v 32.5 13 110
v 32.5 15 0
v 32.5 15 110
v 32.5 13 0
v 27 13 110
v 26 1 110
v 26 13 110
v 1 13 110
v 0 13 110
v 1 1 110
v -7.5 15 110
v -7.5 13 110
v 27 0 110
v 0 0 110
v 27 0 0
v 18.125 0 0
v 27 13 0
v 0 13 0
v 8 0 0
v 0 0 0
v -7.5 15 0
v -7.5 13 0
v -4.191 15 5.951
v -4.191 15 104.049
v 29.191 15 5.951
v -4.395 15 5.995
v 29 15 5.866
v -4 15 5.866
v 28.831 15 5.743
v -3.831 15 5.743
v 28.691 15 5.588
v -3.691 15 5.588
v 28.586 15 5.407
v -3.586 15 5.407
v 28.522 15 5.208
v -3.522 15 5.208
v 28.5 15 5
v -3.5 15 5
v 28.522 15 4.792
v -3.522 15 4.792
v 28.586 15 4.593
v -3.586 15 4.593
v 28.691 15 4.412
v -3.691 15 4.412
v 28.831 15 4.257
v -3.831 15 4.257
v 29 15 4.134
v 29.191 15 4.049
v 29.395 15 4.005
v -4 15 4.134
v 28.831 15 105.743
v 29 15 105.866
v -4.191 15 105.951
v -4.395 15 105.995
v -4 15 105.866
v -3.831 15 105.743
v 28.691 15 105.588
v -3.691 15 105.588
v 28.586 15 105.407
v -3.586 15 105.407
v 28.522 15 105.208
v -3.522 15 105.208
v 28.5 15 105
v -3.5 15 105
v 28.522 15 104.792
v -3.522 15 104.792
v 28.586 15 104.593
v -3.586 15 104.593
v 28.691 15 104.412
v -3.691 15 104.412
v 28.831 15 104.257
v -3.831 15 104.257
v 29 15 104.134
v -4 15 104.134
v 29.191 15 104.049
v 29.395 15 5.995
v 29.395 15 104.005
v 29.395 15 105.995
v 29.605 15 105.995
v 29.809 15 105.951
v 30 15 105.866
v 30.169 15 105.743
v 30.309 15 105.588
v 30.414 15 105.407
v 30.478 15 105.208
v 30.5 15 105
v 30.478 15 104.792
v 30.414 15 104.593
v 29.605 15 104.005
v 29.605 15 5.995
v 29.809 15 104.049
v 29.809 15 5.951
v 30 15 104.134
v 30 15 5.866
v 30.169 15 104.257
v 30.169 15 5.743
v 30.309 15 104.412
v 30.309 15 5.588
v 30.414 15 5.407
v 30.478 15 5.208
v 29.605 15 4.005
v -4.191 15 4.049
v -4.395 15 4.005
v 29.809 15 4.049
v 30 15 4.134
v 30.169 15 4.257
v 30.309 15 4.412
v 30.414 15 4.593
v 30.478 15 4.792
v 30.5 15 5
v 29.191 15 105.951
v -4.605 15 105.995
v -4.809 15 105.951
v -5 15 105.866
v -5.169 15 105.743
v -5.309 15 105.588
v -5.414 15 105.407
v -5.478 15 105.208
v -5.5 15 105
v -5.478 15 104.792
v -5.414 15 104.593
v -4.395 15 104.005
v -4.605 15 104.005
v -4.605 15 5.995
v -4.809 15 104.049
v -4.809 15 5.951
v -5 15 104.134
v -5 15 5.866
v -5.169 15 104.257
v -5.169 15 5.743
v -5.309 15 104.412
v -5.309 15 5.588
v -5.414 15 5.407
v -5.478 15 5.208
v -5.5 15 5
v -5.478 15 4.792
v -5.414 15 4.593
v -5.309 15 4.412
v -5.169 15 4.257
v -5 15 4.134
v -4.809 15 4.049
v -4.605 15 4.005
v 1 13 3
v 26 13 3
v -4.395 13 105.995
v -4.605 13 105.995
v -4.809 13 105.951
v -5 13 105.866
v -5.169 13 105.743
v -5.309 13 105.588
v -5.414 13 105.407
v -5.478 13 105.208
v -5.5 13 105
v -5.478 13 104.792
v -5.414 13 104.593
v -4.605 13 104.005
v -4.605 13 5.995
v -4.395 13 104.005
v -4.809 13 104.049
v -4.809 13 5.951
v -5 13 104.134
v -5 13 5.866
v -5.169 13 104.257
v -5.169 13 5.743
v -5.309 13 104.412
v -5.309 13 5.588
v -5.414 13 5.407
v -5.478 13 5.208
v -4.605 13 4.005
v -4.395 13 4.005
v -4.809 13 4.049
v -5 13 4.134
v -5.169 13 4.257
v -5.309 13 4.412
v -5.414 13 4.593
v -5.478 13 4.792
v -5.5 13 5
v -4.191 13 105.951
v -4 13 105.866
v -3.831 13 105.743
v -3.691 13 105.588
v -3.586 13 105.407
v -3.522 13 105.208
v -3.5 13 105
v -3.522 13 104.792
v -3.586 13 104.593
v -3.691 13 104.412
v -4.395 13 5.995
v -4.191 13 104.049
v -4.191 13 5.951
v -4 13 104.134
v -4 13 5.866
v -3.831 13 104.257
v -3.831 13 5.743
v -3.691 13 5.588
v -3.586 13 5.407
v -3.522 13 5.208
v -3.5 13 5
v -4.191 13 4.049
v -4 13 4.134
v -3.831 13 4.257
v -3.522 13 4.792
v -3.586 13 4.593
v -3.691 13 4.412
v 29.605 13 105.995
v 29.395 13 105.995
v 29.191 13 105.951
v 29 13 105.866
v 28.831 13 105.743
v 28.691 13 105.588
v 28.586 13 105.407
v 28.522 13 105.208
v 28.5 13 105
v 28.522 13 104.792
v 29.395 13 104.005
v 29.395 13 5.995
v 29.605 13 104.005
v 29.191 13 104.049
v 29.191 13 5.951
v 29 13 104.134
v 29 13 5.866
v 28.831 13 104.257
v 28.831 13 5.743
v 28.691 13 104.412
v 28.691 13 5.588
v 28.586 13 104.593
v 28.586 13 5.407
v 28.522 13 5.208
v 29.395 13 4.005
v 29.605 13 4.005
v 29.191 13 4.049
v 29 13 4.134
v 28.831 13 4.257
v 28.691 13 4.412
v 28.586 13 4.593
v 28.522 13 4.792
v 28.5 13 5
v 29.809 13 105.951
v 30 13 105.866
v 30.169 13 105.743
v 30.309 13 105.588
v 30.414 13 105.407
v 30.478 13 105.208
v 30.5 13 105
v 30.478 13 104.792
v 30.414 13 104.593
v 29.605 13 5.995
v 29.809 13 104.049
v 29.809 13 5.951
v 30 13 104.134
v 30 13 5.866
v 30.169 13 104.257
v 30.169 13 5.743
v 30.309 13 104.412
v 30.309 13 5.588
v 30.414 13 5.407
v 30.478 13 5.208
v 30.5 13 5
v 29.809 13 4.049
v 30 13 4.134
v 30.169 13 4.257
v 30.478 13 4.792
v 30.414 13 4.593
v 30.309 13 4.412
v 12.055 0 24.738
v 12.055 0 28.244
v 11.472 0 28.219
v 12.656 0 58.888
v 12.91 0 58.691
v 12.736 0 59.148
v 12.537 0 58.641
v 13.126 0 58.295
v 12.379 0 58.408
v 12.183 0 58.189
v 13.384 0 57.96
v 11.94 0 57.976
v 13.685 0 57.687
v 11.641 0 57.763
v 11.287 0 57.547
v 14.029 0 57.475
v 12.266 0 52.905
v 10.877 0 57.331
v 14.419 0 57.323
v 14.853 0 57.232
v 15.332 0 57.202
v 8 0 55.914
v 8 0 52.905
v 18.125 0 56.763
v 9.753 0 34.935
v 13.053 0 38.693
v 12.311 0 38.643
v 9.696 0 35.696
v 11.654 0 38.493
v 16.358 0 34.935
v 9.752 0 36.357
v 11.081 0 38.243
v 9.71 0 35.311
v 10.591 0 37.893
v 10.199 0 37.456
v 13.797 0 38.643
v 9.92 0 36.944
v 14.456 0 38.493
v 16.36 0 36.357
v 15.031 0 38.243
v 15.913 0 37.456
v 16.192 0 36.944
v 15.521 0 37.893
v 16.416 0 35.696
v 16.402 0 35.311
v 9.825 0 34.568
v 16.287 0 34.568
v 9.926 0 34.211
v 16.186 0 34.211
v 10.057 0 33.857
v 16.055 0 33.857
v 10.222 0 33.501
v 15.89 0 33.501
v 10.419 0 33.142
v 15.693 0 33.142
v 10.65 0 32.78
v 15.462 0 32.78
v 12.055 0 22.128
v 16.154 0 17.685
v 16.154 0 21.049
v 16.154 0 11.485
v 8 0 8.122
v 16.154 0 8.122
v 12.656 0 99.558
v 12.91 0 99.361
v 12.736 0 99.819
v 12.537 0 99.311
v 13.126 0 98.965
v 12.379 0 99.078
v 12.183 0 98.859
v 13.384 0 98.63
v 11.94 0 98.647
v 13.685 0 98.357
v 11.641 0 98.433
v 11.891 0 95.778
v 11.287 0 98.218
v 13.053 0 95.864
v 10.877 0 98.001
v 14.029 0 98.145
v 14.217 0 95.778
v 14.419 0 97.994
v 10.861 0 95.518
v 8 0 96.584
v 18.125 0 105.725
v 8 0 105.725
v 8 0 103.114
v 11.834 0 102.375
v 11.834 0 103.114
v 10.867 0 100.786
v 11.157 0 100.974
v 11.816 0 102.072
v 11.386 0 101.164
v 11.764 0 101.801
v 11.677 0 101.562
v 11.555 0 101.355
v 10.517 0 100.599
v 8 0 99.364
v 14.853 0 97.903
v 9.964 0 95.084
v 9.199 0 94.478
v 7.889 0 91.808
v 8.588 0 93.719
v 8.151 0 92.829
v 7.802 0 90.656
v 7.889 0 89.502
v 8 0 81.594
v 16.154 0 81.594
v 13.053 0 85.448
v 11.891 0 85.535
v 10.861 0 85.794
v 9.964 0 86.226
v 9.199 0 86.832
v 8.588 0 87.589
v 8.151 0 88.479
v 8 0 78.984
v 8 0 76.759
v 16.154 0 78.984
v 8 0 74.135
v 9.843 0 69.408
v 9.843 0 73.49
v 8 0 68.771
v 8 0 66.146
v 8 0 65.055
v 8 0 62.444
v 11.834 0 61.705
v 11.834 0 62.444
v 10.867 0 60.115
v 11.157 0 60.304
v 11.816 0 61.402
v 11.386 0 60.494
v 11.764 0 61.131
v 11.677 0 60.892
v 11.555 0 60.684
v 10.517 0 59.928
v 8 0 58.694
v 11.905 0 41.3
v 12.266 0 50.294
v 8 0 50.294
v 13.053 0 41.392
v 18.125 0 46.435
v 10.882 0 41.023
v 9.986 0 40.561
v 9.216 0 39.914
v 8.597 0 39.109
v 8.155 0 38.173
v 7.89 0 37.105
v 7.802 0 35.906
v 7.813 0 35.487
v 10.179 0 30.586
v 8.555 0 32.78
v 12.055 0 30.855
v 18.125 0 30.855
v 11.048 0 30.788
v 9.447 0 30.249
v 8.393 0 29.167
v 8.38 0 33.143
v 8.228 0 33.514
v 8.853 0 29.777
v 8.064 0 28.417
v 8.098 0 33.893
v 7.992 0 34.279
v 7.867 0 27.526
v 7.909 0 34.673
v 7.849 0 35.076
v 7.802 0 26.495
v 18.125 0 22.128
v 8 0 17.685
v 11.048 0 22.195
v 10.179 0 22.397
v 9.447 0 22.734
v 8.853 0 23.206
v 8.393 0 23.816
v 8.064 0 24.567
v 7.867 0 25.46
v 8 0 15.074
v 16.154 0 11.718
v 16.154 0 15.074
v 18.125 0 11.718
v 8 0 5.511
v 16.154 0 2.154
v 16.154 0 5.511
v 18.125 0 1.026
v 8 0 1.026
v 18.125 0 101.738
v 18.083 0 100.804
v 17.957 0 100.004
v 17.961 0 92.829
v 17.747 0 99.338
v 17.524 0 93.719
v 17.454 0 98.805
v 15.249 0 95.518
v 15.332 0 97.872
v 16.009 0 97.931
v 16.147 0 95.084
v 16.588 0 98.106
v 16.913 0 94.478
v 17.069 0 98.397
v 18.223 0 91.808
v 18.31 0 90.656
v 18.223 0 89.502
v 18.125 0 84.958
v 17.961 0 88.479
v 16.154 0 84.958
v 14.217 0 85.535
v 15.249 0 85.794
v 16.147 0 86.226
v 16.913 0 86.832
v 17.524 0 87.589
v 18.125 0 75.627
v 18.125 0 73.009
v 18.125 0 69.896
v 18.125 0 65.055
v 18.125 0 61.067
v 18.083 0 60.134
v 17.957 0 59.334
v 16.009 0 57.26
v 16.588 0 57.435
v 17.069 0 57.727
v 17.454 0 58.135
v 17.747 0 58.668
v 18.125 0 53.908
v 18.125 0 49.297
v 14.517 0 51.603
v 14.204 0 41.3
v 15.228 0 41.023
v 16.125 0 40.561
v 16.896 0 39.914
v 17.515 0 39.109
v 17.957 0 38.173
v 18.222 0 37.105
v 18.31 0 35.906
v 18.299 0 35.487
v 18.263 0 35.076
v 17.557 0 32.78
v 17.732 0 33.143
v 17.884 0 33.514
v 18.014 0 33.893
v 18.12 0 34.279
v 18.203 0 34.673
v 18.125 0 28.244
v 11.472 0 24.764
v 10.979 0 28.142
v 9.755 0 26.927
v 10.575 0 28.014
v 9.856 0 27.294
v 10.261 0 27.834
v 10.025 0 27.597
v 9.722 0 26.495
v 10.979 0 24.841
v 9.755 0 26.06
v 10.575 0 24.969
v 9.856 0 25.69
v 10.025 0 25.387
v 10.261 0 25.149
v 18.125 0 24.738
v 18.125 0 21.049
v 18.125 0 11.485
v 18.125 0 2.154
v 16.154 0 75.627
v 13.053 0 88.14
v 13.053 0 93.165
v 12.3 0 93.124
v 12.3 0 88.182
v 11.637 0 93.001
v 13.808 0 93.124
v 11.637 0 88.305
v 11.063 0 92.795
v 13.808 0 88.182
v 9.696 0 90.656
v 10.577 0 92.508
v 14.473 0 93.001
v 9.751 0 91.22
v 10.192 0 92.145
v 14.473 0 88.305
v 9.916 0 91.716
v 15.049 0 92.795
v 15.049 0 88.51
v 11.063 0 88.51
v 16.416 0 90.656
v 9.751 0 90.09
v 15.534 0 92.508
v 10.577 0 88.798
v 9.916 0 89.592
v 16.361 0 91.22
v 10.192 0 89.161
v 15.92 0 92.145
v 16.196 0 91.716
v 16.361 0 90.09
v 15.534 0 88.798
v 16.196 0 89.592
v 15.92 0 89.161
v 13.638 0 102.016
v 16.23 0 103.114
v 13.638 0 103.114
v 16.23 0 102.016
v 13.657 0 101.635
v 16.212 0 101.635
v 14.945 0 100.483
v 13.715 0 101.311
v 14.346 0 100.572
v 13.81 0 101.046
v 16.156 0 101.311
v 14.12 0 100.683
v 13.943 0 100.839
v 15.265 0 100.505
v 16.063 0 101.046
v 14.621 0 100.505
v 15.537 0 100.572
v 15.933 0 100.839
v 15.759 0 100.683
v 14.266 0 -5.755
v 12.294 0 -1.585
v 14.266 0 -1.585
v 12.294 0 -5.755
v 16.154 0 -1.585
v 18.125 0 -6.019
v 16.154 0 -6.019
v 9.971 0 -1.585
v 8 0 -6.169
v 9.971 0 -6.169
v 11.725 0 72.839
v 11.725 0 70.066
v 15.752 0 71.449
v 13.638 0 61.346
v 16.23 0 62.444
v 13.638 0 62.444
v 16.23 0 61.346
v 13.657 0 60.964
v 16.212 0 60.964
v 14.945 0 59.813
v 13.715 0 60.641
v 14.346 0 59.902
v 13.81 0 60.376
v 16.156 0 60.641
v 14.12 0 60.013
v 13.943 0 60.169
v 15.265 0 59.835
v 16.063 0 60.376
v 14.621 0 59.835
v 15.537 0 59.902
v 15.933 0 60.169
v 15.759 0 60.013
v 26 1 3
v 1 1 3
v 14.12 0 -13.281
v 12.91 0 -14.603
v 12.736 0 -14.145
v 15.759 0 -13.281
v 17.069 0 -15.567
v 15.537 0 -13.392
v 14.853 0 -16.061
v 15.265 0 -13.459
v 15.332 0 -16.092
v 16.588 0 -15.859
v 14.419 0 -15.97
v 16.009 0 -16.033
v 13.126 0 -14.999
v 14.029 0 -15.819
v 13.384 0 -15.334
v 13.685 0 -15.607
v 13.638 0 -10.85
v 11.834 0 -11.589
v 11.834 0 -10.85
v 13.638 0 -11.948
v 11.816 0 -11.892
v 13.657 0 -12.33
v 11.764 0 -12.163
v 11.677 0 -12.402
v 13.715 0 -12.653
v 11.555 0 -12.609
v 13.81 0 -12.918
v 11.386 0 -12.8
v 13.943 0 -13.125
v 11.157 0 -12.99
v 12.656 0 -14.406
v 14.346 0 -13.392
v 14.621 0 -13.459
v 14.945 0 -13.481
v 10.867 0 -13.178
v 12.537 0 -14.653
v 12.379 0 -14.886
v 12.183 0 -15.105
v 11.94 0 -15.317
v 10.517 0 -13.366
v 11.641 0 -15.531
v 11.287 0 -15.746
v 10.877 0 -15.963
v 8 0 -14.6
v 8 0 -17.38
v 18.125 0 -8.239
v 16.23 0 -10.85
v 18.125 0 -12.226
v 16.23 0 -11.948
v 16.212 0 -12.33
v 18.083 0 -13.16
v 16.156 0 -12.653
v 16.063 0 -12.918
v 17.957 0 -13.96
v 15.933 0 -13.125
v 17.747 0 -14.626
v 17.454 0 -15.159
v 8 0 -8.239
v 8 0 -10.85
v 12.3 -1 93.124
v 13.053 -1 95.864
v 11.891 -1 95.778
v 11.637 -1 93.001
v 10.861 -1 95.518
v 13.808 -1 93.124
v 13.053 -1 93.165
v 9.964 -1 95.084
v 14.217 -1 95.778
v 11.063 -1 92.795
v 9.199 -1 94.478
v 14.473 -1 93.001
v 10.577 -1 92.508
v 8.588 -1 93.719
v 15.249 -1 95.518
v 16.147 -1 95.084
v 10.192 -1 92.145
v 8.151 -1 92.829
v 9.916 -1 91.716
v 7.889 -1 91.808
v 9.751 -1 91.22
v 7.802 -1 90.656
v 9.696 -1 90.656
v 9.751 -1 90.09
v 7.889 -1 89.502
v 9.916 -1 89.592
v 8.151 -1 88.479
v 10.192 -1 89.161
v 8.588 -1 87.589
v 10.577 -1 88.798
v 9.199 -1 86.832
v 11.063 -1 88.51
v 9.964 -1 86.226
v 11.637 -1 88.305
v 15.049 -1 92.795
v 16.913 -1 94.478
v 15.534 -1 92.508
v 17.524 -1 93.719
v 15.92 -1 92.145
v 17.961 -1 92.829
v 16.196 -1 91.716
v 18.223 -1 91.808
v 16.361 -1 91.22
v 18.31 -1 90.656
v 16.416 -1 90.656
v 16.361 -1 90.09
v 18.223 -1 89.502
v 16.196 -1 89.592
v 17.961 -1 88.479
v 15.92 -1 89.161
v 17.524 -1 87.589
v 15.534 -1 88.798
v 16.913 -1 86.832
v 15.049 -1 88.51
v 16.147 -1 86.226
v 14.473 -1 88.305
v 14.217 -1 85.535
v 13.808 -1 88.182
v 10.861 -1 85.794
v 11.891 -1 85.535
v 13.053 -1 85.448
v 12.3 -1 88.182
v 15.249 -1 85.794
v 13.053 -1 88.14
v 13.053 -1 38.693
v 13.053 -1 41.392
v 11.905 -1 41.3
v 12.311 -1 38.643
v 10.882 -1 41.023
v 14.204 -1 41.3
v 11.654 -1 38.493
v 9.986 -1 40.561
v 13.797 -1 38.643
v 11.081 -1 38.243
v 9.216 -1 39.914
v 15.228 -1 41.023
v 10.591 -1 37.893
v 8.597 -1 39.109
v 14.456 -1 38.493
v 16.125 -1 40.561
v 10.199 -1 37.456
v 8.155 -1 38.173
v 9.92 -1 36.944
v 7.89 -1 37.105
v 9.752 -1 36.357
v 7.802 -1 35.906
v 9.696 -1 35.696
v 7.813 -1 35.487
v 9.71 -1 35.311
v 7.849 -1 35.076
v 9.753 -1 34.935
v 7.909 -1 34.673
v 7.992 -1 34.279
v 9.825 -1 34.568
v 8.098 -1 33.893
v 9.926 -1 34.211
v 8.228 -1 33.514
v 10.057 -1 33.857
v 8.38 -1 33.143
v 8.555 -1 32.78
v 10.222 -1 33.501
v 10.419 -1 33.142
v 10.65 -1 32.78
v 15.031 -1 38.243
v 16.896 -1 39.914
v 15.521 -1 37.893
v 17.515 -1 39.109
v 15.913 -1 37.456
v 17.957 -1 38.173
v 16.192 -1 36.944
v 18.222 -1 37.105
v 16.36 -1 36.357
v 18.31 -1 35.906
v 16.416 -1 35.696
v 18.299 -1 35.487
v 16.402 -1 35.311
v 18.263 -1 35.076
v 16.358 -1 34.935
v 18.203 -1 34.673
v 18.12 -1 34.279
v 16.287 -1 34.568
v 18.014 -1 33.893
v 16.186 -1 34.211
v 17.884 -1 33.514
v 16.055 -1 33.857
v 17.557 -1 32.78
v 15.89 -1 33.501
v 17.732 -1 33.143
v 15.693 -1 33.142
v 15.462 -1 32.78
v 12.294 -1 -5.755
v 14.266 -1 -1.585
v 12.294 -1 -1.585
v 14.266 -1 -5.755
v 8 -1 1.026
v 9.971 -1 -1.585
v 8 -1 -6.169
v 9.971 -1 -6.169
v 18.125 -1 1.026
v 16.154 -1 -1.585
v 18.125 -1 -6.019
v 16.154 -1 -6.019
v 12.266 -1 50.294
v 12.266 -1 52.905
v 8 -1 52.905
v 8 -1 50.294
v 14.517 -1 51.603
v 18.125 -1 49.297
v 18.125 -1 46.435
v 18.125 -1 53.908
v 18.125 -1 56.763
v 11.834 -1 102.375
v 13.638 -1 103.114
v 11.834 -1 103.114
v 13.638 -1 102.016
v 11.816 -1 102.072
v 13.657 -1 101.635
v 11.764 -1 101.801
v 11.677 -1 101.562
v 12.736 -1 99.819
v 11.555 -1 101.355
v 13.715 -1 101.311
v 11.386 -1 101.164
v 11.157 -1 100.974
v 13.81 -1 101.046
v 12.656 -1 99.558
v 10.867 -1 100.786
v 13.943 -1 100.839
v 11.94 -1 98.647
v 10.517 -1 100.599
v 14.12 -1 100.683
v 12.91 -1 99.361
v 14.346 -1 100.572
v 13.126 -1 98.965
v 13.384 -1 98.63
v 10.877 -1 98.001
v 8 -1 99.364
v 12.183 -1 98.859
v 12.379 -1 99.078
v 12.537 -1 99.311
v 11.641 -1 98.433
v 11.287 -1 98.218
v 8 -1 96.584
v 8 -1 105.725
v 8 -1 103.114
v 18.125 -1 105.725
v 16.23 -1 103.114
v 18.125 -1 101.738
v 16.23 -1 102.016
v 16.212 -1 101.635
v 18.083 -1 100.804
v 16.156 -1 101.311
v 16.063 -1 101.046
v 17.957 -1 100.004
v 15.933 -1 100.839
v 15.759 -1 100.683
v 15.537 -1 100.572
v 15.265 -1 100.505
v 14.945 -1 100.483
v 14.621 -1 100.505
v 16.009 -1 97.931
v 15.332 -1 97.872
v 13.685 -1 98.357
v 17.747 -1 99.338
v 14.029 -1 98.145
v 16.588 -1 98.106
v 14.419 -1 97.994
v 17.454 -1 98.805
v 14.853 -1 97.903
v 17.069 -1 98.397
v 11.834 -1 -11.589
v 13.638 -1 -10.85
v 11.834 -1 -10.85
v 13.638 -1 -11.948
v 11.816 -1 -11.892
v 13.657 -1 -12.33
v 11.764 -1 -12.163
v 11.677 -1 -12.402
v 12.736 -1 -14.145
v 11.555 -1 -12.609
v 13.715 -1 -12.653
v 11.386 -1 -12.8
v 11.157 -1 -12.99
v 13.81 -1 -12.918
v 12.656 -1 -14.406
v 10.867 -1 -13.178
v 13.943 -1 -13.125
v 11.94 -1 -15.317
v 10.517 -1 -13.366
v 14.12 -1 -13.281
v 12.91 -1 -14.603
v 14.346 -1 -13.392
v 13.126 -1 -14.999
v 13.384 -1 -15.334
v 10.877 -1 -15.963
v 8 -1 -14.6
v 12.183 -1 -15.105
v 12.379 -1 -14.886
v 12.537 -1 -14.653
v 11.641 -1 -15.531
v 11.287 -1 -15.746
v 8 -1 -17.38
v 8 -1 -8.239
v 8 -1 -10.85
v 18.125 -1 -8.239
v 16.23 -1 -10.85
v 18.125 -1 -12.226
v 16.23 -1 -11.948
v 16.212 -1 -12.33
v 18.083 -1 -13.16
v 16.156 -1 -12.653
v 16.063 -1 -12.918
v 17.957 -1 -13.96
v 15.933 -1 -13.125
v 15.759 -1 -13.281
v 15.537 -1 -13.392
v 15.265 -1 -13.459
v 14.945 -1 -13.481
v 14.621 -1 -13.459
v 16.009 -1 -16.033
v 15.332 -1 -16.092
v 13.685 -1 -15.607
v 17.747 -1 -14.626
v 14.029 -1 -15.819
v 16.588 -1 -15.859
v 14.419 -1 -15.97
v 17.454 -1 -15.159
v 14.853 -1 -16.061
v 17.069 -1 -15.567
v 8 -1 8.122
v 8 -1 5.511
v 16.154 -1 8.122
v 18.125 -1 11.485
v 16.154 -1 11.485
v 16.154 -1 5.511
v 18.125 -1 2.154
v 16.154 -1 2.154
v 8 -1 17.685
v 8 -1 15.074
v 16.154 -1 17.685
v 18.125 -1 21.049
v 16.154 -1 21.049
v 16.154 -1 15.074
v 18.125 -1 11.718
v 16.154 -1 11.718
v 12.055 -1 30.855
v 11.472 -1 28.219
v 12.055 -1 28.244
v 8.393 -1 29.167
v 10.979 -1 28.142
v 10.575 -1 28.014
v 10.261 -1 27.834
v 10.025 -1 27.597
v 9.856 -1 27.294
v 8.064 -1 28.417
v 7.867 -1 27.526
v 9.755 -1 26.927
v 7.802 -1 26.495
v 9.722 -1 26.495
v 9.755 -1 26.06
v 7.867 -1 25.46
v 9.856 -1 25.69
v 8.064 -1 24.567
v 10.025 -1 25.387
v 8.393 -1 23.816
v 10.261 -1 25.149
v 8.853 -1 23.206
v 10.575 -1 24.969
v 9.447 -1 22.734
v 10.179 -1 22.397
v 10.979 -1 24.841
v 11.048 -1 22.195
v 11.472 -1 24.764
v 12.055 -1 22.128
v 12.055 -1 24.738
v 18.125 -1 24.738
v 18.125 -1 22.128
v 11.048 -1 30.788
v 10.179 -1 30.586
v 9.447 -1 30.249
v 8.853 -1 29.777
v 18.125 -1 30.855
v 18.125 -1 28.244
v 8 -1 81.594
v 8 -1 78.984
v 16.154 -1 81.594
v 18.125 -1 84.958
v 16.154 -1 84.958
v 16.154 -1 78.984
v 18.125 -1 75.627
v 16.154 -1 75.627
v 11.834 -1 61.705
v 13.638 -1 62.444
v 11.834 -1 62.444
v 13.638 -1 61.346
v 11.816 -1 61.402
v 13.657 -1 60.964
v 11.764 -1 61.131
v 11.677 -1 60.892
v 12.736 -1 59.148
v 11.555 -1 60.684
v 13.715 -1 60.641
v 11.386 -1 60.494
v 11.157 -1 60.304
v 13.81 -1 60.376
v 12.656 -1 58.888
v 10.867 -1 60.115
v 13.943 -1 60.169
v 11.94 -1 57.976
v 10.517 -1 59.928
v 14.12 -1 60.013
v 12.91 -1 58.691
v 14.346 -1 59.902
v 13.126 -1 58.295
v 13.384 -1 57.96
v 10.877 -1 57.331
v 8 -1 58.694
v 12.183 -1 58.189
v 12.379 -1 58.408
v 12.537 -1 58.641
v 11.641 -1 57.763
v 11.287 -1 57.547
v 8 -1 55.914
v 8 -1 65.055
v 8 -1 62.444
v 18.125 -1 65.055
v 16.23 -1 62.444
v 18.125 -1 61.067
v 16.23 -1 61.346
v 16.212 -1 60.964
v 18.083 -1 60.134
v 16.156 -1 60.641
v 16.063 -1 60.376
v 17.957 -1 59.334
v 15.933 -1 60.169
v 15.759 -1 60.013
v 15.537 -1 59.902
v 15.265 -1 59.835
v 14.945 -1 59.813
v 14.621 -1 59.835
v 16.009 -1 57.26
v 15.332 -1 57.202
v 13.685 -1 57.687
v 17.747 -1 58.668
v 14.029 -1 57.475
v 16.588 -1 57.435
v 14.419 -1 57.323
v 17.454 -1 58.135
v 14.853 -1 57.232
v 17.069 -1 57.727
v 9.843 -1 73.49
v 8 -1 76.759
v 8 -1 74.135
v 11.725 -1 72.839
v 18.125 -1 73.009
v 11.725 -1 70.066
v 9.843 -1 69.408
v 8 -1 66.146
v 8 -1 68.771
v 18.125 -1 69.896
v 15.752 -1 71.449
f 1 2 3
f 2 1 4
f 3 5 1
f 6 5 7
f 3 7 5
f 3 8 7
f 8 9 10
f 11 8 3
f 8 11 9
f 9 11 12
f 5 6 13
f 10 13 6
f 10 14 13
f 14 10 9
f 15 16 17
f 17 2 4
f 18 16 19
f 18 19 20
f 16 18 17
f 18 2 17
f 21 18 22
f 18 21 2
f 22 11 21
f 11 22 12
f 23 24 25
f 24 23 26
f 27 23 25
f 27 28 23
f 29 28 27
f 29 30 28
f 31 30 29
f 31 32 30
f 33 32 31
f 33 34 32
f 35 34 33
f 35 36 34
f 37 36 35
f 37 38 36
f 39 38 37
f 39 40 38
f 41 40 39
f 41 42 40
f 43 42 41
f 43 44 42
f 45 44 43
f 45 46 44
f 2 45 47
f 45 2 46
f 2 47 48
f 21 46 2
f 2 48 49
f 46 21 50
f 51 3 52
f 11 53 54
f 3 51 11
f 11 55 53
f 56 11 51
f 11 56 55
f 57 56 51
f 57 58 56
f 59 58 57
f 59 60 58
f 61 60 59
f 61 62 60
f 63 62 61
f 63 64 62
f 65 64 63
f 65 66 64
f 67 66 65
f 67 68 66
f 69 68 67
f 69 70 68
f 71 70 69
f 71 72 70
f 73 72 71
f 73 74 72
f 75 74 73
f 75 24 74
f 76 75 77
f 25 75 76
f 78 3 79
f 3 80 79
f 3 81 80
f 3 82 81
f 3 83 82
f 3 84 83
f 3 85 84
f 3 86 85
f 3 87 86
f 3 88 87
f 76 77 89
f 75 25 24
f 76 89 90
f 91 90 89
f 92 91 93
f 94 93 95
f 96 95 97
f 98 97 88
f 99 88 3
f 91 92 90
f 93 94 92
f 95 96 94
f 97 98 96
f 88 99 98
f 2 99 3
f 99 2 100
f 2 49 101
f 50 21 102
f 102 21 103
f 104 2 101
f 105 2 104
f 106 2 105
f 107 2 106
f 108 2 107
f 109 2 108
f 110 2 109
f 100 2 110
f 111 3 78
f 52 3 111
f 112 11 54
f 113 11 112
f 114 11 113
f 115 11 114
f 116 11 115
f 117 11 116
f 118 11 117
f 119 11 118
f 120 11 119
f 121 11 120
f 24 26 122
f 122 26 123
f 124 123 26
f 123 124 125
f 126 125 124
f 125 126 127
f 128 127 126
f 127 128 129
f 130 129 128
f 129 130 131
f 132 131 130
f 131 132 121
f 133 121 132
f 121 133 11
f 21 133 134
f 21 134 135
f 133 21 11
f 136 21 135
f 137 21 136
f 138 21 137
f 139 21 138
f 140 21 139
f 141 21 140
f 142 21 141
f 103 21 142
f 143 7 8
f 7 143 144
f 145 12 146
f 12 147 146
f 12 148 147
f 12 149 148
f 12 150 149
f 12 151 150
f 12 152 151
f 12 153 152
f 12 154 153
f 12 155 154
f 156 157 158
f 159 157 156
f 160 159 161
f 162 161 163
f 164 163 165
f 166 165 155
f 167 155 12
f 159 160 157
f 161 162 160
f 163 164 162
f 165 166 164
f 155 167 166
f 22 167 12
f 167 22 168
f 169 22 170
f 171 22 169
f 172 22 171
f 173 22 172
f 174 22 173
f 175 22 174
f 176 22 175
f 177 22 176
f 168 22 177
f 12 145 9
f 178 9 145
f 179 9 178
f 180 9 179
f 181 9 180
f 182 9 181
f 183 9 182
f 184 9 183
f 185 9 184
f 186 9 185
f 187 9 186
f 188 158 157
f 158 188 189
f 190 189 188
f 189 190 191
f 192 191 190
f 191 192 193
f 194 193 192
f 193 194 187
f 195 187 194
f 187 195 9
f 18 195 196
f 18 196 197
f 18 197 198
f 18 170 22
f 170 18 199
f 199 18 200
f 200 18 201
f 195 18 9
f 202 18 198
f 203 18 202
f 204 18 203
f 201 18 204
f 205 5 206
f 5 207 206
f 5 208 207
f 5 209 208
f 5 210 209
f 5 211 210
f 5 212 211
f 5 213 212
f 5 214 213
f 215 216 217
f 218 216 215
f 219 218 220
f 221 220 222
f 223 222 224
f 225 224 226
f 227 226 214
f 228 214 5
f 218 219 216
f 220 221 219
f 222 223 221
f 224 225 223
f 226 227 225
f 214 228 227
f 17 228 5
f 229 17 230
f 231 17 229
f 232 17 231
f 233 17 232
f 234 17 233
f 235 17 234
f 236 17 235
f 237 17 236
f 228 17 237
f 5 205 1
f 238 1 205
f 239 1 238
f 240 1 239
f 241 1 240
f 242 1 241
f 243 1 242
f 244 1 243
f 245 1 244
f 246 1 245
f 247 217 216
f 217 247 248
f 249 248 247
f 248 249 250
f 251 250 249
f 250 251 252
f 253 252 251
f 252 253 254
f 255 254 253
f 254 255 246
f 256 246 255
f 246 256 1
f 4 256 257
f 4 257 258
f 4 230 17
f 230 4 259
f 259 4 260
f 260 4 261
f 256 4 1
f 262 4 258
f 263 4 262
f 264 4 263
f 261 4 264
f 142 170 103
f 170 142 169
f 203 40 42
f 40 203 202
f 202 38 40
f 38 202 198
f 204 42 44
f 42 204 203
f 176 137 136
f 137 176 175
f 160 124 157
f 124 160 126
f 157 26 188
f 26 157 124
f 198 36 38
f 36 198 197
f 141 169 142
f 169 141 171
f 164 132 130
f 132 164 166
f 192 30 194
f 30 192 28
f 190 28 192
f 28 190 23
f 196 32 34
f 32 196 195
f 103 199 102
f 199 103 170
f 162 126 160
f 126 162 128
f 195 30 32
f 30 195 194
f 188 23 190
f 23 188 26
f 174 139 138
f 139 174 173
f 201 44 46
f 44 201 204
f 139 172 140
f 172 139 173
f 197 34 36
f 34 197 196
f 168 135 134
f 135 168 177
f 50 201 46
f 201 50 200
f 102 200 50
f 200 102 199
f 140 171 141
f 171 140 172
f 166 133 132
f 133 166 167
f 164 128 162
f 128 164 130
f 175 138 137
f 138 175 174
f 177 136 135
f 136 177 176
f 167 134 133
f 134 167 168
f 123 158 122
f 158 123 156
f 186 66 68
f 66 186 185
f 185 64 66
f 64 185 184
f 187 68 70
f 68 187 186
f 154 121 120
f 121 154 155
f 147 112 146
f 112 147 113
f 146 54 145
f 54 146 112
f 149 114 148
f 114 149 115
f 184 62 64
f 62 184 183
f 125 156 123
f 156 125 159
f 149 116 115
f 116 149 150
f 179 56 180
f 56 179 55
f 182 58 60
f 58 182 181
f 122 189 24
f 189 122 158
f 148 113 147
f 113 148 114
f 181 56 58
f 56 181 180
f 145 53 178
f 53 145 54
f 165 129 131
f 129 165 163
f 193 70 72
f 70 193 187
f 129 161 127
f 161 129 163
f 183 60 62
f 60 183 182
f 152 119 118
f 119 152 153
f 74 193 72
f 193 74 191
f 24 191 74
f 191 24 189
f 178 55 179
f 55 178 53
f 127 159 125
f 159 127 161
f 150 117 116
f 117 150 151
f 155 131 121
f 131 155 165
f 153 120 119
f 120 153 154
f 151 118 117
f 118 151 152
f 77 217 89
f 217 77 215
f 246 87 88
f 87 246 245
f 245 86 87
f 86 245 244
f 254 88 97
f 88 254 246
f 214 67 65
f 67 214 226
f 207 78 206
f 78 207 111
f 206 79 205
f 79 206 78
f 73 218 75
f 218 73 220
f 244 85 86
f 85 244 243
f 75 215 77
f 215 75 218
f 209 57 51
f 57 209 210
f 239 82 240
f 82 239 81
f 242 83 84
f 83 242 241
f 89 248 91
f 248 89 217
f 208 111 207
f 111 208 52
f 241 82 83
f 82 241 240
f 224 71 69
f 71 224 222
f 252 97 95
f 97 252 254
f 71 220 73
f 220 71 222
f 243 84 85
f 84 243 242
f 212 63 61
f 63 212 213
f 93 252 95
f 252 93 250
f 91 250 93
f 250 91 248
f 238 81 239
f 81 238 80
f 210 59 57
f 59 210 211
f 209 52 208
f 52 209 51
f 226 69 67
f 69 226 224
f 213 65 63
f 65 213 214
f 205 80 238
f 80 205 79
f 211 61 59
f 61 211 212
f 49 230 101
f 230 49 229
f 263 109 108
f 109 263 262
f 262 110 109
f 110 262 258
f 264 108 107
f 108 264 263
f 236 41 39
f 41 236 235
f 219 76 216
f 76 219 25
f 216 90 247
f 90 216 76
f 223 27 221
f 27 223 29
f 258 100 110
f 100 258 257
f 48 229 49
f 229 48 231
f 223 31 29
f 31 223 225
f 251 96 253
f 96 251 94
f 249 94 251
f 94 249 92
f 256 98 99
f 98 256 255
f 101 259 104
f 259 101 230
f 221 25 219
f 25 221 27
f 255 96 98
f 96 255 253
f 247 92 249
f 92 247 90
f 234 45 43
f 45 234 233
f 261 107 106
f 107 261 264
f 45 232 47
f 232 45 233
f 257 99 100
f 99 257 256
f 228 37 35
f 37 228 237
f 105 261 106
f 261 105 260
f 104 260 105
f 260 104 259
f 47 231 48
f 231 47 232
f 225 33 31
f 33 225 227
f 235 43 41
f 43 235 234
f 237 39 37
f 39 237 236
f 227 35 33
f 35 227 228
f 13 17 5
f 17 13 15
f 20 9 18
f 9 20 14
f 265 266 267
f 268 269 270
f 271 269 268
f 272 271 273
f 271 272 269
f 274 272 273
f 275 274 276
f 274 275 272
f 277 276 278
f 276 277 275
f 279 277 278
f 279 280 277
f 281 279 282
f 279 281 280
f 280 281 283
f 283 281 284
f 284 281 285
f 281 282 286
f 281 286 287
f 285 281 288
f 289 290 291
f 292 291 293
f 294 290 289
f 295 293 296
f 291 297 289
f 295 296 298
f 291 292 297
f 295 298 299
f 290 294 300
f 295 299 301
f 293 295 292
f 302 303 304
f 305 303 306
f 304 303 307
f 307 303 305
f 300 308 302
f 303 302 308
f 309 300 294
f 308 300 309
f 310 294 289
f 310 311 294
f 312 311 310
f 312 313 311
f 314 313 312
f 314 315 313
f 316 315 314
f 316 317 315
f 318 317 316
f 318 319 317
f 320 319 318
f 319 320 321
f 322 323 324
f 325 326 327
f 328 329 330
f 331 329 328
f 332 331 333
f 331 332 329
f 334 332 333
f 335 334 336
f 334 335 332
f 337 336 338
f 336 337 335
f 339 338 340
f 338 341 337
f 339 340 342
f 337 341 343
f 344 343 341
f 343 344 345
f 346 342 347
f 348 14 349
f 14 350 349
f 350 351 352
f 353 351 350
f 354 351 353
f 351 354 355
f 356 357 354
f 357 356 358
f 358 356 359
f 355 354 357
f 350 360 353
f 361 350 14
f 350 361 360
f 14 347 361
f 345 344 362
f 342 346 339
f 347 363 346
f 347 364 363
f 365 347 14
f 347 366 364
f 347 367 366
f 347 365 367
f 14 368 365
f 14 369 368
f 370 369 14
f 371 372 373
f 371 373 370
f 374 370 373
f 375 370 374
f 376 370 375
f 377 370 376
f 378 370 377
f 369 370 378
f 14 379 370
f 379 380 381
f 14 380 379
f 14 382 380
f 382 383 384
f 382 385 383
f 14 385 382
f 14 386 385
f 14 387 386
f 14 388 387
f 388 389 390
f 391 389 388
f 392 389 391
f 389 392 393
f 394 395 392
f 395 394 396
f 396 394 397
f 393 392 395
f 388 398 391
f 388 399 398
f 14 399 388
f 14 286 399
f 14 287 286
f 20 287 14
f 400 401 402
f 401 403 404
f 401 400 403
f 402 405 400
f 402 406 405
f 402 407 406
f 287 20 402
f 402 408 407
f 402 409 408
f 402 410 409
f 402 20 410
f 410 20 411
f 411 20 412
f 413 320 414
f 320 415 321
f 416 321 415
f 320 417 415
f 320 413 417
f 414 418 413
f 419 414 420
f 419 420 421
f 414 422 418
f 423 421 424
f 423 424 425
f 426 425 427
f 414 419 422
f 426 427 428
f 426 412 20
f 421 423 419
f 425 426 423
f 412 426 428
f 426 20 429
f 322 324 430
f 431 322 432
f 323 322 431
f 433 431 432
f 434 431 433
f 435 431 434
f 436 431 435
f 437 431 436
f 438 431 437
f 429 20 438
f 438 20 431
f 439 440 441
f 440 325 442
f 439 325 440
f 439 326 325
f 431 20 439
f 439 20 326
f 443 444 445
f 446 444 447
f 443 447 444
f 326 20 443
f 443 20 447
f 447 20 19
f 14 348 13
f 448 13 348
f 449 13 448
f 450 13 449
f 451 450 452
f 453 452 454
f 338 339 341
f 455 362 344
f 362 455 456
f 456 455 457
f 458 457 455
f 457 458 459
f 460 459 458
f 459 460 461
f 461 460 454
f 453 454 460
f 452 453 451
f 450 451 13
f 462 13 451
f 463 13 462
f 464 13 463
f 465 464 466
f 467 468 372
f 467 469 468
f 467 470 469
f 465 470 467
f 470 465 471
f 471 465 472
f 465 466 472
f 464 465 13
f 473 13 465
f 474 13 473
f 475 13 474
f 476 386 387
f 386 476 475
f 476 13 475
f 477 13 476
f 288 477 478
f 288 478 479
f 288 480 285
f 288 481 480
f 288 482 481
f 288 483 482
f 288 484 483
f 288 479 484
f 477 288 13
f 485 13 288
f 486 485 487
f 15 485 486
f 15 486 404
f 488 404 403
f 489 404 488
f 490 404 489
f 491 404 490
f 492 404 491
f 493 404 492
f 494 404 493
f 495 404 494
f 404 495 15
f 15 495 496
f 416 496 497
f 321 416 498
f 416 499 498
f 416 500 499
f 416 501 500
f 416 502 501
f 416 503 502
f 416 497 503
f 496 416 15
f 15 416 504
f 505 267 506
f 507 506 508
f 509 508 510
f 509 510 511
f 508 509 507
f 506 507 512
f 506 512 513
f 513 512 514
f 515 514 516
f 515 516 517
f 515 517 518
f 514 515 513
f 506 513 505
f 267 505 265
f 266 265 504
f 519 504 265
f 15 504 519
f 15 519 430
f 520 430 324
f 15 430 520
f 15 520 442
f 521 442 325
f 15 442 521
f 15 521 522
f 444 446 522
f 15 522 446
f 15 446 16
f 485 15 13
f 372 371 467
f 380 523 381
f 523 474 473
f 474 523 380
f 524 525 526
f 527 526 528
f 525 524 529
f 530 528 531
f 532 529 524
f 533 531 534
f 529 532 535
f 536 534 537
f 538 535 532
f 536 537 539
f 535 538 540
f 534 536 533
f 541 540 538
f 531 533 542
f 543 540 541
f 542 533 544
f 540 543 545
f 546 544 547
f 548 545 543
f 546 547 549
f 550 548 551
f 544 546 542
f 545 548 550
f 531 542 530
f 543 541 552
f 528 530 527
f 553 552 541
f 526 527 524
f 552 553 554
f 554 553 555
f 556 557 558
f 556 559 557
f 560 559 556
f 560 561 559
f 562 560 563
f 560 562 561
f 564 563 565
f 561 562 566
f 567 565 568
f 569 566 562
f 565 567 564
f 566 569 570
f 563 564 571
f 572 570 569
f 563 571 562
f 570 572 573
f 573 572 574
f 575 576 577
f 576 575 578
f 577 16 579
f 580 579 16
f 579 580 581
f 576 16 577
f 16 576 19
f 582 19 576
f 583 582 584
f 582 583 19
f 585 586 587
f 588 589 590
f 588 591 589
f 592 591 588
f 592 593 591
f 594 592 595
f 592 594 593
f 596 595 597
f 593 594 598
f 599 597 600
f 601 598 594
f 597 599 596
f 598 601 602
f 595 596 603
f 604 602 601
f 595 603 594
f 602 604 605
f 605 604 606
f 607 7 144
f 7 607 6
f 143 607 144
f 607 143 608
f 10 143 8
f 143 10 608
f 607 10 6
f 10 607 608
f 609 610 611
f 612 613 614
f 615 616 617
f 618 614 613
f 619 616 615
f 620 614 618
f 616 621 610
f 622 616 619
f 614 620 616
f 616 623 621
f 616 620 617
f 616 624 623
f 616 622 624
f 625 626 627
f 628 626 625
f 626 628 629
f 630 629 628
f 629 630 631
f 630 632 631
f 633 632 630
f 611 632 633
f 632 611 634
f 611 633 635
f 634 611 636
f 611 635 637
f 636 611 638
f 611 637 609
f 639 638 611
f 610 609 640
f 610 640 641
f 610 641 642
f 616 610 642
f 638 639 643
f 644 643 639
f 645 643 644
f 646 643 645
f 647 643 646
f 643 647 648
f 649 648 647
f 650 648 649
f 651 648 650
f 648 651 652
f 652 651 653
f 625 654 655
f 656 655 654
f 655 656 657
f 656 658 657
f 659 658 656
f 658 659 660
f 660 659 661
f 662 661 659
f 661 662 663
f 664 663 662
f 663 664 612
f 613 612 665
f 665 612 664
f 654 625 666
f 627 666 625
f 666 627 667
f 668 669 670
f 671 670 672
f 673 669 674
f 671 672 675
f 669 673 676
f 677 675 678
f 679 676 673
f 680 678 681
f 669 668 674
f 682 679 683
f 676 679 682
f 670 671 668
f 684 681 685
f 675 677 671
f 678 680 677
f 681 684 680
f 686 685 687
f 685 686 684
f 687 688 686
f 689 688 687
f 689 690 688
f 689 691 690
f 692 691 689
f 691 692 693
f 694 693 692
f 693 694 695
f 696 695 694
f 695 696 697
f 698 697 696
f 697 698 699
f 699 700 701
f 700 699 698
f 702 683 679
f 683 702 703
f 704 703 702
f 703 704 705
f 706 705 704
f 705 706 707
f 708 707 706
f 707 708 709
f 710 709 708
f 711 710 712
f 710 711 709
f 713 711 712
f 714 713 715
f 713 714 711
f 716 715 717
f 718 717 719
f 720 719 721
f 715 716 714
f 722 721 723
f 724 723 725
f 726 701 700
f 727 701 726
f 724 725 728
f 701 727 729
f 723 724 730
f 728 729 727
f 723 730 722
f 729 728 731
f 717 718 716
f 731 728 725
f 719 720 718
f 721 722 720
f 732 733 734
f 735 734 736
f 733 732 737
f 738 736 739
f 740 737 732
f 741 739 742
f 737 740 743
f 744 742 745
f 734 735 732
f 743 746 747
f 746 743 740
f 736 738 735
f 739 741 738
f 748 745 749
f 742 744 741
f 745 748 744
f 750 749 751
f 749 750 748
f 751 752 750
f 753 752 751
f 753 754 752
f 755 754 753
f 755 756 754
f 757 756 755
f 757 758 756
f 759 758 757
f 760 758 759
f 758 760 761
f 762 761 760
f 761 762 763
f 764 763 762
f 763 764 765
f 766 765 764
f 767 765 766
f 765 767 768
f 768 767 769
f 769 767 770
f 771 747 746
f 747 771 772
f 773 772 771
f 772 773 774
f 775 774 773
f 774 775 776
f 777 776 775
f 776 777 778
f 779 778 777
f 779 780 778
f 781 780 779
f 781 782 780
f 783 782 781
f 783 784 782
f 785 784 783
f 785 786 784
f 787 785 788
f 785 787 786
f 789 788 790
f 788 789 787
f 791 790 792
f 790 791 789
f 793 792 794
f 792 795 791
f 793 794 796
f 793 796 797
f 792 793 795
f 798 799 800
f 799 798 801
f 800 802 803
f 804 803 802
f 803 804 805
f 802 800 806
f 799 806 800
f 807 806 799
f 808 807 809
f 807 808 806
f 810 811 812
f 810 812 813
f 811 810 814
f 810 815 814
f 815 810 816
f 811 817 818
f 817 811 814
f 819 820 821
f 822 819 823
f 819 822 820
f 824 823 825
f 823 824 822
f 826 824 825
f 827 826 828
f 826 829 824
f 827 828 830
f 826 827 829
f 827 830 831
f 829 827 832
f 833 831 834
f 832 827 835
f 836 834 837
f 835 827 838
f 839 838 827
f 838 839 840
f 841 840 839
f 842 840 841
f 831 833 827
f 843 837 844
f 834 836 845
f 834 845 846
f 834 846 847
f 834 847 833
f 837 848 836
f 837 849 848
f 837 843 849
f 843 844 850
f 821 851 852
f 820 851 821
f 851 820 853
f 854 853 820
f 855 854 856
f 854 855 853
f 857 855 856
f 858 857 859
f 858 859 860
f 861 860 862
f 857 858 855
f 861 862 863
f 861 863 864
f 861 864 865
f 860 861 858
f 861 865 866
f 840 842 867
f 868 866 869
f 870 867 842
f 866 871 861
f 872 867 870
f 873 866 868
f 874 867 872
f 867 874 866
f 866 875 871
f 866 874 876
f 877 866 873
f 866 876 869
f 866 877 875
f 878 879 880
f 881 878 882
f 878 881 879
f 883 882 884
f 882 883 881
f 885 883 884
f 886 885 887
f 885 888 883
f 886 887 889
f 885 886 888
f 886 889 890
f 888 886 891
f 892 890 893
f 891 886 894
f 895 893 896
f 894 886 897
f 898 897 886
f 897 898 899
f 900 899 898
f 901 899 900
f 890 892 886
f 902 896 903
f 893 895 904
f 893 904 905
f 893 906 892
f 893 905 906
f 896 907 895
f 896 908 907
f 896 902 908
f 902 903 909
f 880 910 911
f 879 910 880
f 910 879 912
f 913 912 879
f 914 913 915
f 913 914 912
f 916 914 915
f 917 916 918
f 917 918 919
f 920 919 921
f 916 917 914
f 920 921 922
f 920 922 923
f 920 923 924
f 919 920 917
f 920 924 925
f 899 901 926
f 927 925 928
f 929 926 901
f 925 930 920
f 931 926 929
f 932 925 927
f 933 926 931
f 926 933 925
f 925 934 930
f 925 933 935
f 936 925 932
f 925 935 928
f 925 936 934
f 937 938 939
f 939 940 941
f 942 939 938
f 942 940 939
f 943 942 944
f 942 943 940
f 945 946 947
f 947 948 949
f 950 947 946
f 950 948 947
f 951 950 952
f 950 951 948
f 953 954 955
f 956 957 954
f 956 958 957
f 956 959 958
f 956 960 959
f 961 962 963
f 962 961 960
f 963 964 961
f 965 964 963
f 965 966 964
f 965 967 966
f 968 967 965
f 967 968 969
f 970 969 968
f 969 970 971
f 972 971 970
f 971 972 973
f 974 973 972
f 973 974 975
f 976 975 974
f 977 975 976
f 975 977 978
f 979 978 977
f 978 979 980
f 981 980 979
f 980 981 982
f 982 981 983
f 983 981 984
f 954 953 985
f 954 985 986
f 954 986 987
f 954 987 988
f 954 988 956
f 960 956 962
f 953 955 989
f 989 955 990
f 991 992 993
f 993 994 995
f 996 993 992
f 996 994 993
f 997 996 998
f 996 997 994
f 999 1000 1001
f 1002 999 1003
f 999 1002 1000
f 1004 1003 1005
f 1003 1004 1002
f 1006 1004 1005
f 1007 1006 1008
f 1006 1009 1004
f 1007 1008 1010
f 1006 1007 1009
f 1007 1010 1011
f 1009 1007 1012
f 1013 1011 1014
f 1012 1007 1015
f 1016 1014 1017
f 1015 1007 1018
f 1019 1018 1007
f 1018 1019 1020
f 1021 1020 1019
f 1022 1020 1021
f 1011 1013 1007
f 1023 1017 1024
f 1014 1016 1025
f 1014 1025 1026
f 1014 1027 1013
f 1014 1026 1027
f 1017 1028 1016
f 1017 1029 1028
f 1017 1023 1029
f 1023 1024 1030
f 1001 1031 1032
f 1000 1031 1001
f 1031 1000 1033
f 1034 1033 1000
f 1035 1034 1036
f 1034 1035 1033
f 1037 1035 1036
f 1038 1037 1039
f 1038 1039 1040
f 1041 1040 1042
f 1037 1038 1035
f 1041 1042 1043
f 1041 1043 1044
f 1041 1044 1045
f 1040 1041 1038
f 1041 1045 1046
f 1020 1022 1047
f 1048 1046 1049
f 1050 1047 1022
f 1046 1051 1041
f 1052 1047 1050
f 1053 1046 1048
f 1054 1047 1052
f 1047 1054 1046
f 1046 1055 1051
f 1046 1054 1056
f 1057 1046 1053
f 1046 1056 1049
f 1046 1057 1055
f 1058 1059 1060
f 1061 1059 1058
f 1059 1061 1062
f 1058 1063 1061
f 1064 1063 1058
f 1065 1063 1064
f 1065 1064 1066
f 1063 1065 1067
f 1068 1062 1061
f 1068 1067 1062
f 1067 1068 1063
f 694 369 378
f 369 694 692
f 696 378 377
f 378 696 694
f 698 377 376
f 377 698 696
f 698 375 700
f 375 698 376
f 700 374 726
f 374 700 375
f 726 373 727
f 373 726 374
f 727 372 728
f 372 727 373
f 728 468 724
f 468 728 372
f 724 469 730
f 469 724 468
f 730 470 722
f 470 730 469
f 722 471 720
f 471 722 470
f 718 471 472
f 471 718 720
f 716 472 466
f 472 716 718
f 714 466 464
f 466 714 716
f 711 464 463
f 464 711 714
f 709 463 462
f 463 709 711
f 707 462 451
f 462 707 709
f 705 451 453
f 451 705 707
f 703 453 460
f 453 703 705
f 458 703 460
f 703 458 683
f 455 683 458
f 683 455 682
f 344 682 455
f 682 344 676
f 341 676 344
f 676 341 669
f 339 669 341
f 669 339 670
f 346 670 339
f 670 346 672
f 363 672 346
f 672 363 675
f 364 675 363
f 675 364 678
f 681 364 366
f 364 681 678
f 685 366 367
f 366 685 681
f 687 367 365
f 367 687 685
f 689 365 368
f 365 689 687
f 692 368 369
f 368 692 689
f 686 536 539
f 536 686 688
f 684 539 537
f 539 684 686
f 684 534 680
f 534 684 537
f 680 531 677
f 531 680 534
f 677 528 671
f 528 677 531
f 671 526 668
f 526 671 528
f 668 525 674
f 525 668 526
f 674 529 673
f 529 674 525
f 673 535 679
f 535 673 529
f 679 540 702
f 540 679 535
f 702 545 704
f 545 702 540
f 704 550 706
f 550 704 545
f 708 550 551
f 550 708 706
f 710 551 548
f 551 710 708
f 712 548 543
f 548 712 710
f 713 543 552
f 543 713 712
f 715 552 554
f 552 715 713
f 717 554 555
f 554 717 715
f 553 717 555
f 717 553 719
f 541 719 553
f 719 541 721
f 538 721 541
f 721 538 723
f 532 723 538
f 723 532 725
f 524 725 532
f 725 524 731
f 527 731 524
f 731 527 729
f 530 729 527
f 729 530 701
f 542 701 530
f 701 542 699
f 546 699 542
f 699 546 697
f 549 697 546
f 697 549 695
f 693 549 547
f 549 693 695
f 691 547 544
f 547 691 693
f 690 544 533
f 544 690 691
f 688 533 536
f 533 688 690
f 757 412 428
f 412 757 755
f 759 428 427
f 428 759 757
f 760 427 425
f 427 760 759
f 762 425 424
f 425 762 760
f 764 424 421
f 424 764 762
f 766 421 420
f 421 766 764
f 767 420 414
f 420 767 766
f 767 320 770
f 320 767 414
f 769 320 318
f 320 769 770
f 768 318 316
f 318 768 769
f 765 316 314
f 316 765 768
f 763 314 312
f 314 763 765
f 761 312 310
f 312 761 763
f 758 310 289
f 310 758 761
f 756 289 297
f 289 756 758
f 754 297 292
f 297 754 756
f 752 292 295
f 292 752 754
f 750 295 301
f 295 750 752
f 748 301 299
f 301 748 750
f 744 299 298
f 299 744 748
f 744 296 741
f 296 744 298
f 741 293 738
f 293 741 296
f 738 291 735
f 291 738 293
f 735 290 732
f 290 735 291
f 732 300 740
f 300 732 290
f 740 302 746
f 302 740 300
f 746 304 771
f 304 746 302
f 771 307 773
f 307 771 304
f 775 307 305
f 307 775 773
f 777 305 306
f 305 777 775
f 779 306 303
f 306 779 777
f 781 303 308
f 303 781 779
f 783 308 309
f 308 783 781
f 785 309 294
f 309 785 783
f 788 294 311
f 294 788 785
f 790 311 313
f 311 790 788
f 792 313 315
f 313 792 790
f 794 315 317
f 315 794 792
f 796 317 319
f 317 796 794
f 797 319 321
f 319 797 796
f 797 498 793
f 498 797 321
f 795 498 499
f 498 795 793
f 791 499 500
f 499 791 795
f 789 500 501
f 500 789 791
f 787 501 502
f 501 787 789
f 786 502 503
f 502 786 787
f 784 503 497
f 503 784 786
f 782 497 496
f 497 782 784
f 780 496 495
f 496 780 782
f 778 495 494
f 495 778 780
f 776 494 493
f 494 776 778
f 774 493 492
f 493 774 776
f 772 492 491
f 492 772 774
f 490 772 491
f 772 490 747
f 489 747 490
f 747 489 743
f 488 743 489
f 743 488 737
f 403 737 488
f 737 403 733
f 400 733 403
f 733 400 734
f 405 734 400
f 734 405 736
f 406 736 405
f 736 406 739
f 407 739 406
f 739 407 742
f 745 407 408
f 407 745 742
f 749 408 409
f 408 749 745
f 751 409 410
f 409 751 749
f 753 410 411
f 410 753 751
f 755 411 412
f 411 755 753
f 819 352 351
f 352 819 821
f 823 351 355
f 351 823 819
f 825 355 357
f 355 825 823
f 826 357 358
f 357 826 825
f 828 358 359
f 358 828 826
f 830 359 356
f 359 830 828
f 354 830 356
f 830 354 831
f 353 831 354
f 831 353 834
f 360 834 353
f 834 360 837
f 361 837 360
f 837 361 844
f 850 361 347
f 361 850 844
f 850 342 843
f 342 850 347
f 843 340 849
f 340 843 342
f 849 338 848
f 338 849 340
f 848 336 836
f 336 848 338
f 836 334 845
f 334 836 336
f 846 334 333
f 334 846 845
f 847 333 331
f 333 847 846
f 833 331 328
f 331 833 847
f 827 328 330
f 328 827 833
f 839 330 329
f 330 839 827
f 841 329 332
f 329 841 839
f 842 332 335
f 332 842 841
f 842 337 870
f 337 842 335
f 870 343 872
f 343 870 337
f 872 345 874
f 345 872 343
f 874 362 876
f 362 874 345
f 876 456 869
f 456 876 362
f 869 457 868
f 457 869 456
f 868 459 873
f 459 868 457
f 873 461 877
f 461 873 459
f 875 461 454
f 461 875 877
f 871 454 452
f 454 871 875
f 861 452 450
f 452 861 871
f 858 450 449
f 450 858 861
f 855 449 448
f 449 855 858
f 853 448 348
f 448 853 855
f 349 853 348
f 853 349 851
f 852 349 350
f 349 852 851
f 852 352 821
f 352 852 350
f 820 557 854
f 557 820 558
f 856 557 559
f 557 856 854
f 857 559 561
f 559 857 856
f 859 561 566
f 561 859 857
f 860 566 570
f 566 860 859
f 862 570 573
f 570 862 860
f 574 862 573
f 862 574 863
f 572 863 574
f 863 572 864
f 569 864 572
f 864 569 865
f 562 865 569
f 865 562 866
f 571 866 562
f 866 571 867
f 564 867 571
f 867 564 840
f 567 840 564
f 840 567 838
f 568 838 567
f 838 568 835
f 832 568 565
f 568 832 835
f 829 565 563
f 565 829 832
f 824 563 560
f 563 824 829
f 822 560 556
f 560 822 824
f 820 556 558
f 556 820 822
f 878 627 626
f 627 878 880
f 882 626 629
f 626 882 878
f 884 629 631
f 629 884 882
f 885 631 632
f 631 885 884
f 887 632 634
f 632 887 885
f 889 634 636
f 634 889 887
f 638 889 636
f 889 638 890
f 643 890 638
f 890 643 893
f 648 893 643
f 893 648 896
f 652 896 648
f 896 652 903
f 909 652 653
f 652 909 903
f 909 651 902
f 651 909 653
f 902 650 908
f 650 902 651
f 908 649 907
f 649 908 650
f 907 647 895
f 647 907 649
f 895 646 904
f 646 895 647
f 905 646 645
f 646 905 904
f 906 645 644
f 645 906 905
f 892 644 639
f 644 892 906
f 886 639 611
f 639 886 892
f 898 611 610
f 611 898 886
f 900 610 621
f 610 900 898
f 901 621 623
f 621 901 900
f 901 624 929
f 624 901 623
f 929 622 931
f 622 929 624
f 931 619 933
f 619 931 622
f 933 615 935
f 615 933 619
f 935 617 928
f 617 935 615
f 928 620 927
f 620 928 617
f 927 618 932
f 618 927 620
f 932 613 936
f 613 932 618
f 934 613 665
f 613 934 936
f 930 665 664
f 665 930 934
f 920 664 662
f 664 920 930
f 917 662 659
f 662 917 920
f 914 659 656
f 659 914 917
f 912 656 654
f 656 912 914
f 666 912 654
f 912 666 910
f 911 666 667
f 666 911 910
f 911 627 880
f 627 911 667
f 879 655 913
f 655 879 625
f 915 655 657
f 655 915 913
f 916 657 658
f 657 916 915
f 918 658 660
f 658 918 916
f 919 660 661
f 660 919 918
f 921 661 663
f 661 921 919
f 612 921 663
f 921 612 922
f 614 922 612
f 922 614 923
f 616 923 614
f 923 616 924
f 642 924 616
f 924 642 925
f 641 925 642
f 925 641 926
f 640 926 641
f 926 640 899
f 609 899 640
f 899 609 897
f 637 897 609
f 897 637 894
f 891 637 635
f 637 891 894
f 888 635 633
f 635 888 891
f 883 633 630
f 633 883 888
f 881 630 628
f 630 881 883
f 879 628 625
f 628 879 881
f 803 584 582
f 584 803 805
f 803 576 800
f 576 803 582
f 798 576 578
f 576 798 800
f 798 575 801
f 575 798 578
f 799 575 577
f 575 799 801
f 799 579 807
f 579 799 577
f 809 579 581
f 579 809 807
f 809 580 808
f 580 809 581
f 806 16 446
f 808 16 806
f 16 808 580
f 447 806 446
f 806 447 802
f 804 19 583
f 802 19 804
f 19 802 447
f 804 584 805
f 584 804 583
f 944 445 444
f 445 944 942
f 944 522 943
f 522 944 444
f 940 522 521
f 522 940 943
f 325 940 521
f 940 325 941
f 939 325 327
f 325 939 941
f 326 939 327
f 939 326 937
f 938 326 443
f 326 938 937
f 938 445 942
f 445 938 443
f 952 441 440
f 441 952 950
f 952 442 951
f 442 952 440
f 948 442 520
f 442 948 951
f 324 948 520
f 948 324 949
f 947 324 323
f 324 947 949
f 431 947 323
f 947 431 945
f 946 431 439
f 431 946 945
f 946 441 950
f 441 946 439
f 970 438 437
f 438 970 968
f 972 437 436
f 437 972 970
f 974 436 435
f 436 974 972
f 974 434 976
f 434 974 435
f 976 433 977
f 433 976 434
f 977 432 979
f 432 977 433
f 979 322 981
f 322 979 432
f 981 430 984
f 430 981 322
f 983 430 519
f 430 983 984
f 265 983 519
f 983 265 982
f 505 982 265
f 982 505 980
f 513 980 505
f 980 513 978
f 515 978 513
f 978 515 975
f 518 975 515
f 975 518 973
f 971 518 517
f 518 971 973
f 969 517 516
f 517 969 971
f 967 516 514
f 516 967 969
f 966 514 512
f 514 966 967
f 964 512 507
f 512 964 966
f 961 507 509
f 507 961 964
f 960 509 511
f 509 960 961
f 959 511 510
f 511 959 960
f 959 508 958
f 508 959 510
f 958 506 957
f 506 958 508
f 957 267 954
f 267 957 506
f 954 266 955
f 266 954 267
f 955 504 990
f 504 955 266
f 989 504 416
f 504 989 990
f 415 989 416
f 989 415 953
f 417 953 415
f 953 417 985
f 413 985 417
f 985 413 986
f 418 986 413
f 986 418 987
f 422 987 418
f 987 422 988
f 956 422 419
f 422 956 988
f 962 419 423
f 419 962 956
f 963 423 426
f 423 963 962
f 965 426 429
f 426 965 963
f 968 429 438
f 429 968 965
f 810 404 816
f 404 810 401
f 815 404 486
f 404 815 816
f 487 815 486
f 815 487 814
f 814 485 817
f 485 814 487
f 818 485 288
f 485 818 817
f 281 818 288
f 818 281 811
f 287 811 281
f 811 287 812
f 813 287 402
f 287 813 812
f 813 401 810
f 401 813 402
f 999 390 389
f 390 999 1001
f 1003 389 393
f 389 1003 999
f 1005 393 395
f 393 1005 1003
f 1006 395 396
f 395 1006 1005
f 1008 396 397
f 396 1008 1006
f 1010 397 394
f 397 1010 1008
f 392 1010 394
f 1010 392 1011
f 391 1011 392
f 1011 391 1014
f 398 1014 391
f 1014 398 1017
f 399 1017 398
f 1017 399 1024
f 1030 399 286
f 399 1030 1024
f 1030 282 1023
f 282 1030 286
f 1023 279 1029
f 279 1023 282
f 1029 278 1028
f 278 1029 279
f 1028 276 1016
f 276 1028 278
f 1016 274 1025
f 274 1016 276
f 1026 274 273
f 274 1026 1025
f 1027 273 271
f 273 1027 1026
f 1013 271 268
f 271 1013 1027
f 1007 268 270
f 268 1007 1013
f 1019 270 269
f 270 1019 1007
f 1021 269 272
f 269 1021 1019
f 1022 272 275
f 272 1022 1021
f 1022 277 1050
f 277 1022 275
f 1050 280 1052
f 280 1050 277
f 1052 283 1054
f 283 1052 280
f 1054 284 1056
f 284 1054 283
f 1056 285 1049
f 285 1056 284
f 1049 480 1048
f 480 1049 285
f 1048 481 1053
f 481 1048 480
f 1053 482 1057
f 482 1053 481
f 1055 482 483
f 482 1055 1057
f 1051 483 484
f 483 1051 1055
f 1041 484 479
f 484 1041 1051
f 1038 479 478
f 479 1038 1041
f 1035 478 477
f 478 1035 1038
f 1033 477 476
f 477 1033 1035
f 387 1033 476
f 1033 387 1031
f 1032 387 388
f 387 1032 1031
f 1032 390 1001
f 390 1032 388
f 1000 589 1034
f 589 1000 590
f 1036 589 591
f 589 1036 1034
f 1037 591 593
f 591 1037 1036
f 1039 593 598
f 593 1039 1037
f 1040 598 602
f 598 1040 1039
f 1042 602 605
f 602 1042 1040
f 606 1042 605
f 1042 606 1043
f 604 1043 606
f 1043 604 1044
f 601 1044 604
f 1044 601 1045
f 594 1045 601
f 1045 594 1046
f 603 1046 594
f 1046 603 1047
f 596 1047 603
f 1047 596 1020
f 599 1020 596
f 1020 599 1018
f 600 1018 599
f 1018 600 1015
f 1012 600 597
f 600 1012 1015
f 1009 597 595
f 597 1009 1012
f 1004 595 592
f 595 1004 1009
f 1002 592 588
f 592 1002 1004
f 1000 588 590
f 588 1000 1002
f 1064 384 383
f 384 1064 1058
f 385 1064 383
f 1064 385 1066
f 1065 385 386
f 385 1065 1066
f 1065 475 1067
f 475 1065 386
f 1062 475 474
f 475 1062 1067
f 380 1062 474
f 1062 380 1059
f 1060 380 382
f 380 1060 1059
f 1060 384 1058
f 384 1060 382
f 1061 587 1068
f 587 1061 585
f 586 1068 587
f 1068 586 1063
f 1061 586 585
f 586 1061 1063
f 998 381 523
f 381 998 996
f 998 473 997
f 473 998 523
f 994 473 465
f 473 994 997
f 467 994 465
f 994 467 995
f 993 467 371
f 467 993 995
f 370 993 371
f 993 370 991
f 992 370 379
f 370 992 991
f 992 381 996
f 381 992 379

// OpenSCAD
$fn=30;

tw= 25;
td=12;
ttd=15;
th=110;


    box();
    translate([8,0,107])
    rotate([90,90,0])
    linear_extrude(height=1)
    text("ROTARY CUTTER", font = "FONTIN:style=Bold");


module box(){
union(){

translate([-(tw + 15-tw)/2,ttd-2,0])
difference(){
cube([tw + 15,2,th]);
    
    translate([3,0,5])
    rotate([-90,0,0])
    cylinder(r=1,h=4);
    
    translate([3,0,th-5])
    rotate([-90,0,0])
    cylinder(r=1,h=4);
    
    translate([tw + 15-3,0,th-5])
    rotate([-90,0,0])
    cylinder(r=1,h=4);
    
    translate([tw+ 15 -3,0,5])
    rotate([-90,0,0])
    cylinder(r=1,h=4);
    
    }

difference(){

//box
cube([tw+2,ttd,th]);    
translate([1,1,3])
cube([tw,td,th]);
    
}

}

}
